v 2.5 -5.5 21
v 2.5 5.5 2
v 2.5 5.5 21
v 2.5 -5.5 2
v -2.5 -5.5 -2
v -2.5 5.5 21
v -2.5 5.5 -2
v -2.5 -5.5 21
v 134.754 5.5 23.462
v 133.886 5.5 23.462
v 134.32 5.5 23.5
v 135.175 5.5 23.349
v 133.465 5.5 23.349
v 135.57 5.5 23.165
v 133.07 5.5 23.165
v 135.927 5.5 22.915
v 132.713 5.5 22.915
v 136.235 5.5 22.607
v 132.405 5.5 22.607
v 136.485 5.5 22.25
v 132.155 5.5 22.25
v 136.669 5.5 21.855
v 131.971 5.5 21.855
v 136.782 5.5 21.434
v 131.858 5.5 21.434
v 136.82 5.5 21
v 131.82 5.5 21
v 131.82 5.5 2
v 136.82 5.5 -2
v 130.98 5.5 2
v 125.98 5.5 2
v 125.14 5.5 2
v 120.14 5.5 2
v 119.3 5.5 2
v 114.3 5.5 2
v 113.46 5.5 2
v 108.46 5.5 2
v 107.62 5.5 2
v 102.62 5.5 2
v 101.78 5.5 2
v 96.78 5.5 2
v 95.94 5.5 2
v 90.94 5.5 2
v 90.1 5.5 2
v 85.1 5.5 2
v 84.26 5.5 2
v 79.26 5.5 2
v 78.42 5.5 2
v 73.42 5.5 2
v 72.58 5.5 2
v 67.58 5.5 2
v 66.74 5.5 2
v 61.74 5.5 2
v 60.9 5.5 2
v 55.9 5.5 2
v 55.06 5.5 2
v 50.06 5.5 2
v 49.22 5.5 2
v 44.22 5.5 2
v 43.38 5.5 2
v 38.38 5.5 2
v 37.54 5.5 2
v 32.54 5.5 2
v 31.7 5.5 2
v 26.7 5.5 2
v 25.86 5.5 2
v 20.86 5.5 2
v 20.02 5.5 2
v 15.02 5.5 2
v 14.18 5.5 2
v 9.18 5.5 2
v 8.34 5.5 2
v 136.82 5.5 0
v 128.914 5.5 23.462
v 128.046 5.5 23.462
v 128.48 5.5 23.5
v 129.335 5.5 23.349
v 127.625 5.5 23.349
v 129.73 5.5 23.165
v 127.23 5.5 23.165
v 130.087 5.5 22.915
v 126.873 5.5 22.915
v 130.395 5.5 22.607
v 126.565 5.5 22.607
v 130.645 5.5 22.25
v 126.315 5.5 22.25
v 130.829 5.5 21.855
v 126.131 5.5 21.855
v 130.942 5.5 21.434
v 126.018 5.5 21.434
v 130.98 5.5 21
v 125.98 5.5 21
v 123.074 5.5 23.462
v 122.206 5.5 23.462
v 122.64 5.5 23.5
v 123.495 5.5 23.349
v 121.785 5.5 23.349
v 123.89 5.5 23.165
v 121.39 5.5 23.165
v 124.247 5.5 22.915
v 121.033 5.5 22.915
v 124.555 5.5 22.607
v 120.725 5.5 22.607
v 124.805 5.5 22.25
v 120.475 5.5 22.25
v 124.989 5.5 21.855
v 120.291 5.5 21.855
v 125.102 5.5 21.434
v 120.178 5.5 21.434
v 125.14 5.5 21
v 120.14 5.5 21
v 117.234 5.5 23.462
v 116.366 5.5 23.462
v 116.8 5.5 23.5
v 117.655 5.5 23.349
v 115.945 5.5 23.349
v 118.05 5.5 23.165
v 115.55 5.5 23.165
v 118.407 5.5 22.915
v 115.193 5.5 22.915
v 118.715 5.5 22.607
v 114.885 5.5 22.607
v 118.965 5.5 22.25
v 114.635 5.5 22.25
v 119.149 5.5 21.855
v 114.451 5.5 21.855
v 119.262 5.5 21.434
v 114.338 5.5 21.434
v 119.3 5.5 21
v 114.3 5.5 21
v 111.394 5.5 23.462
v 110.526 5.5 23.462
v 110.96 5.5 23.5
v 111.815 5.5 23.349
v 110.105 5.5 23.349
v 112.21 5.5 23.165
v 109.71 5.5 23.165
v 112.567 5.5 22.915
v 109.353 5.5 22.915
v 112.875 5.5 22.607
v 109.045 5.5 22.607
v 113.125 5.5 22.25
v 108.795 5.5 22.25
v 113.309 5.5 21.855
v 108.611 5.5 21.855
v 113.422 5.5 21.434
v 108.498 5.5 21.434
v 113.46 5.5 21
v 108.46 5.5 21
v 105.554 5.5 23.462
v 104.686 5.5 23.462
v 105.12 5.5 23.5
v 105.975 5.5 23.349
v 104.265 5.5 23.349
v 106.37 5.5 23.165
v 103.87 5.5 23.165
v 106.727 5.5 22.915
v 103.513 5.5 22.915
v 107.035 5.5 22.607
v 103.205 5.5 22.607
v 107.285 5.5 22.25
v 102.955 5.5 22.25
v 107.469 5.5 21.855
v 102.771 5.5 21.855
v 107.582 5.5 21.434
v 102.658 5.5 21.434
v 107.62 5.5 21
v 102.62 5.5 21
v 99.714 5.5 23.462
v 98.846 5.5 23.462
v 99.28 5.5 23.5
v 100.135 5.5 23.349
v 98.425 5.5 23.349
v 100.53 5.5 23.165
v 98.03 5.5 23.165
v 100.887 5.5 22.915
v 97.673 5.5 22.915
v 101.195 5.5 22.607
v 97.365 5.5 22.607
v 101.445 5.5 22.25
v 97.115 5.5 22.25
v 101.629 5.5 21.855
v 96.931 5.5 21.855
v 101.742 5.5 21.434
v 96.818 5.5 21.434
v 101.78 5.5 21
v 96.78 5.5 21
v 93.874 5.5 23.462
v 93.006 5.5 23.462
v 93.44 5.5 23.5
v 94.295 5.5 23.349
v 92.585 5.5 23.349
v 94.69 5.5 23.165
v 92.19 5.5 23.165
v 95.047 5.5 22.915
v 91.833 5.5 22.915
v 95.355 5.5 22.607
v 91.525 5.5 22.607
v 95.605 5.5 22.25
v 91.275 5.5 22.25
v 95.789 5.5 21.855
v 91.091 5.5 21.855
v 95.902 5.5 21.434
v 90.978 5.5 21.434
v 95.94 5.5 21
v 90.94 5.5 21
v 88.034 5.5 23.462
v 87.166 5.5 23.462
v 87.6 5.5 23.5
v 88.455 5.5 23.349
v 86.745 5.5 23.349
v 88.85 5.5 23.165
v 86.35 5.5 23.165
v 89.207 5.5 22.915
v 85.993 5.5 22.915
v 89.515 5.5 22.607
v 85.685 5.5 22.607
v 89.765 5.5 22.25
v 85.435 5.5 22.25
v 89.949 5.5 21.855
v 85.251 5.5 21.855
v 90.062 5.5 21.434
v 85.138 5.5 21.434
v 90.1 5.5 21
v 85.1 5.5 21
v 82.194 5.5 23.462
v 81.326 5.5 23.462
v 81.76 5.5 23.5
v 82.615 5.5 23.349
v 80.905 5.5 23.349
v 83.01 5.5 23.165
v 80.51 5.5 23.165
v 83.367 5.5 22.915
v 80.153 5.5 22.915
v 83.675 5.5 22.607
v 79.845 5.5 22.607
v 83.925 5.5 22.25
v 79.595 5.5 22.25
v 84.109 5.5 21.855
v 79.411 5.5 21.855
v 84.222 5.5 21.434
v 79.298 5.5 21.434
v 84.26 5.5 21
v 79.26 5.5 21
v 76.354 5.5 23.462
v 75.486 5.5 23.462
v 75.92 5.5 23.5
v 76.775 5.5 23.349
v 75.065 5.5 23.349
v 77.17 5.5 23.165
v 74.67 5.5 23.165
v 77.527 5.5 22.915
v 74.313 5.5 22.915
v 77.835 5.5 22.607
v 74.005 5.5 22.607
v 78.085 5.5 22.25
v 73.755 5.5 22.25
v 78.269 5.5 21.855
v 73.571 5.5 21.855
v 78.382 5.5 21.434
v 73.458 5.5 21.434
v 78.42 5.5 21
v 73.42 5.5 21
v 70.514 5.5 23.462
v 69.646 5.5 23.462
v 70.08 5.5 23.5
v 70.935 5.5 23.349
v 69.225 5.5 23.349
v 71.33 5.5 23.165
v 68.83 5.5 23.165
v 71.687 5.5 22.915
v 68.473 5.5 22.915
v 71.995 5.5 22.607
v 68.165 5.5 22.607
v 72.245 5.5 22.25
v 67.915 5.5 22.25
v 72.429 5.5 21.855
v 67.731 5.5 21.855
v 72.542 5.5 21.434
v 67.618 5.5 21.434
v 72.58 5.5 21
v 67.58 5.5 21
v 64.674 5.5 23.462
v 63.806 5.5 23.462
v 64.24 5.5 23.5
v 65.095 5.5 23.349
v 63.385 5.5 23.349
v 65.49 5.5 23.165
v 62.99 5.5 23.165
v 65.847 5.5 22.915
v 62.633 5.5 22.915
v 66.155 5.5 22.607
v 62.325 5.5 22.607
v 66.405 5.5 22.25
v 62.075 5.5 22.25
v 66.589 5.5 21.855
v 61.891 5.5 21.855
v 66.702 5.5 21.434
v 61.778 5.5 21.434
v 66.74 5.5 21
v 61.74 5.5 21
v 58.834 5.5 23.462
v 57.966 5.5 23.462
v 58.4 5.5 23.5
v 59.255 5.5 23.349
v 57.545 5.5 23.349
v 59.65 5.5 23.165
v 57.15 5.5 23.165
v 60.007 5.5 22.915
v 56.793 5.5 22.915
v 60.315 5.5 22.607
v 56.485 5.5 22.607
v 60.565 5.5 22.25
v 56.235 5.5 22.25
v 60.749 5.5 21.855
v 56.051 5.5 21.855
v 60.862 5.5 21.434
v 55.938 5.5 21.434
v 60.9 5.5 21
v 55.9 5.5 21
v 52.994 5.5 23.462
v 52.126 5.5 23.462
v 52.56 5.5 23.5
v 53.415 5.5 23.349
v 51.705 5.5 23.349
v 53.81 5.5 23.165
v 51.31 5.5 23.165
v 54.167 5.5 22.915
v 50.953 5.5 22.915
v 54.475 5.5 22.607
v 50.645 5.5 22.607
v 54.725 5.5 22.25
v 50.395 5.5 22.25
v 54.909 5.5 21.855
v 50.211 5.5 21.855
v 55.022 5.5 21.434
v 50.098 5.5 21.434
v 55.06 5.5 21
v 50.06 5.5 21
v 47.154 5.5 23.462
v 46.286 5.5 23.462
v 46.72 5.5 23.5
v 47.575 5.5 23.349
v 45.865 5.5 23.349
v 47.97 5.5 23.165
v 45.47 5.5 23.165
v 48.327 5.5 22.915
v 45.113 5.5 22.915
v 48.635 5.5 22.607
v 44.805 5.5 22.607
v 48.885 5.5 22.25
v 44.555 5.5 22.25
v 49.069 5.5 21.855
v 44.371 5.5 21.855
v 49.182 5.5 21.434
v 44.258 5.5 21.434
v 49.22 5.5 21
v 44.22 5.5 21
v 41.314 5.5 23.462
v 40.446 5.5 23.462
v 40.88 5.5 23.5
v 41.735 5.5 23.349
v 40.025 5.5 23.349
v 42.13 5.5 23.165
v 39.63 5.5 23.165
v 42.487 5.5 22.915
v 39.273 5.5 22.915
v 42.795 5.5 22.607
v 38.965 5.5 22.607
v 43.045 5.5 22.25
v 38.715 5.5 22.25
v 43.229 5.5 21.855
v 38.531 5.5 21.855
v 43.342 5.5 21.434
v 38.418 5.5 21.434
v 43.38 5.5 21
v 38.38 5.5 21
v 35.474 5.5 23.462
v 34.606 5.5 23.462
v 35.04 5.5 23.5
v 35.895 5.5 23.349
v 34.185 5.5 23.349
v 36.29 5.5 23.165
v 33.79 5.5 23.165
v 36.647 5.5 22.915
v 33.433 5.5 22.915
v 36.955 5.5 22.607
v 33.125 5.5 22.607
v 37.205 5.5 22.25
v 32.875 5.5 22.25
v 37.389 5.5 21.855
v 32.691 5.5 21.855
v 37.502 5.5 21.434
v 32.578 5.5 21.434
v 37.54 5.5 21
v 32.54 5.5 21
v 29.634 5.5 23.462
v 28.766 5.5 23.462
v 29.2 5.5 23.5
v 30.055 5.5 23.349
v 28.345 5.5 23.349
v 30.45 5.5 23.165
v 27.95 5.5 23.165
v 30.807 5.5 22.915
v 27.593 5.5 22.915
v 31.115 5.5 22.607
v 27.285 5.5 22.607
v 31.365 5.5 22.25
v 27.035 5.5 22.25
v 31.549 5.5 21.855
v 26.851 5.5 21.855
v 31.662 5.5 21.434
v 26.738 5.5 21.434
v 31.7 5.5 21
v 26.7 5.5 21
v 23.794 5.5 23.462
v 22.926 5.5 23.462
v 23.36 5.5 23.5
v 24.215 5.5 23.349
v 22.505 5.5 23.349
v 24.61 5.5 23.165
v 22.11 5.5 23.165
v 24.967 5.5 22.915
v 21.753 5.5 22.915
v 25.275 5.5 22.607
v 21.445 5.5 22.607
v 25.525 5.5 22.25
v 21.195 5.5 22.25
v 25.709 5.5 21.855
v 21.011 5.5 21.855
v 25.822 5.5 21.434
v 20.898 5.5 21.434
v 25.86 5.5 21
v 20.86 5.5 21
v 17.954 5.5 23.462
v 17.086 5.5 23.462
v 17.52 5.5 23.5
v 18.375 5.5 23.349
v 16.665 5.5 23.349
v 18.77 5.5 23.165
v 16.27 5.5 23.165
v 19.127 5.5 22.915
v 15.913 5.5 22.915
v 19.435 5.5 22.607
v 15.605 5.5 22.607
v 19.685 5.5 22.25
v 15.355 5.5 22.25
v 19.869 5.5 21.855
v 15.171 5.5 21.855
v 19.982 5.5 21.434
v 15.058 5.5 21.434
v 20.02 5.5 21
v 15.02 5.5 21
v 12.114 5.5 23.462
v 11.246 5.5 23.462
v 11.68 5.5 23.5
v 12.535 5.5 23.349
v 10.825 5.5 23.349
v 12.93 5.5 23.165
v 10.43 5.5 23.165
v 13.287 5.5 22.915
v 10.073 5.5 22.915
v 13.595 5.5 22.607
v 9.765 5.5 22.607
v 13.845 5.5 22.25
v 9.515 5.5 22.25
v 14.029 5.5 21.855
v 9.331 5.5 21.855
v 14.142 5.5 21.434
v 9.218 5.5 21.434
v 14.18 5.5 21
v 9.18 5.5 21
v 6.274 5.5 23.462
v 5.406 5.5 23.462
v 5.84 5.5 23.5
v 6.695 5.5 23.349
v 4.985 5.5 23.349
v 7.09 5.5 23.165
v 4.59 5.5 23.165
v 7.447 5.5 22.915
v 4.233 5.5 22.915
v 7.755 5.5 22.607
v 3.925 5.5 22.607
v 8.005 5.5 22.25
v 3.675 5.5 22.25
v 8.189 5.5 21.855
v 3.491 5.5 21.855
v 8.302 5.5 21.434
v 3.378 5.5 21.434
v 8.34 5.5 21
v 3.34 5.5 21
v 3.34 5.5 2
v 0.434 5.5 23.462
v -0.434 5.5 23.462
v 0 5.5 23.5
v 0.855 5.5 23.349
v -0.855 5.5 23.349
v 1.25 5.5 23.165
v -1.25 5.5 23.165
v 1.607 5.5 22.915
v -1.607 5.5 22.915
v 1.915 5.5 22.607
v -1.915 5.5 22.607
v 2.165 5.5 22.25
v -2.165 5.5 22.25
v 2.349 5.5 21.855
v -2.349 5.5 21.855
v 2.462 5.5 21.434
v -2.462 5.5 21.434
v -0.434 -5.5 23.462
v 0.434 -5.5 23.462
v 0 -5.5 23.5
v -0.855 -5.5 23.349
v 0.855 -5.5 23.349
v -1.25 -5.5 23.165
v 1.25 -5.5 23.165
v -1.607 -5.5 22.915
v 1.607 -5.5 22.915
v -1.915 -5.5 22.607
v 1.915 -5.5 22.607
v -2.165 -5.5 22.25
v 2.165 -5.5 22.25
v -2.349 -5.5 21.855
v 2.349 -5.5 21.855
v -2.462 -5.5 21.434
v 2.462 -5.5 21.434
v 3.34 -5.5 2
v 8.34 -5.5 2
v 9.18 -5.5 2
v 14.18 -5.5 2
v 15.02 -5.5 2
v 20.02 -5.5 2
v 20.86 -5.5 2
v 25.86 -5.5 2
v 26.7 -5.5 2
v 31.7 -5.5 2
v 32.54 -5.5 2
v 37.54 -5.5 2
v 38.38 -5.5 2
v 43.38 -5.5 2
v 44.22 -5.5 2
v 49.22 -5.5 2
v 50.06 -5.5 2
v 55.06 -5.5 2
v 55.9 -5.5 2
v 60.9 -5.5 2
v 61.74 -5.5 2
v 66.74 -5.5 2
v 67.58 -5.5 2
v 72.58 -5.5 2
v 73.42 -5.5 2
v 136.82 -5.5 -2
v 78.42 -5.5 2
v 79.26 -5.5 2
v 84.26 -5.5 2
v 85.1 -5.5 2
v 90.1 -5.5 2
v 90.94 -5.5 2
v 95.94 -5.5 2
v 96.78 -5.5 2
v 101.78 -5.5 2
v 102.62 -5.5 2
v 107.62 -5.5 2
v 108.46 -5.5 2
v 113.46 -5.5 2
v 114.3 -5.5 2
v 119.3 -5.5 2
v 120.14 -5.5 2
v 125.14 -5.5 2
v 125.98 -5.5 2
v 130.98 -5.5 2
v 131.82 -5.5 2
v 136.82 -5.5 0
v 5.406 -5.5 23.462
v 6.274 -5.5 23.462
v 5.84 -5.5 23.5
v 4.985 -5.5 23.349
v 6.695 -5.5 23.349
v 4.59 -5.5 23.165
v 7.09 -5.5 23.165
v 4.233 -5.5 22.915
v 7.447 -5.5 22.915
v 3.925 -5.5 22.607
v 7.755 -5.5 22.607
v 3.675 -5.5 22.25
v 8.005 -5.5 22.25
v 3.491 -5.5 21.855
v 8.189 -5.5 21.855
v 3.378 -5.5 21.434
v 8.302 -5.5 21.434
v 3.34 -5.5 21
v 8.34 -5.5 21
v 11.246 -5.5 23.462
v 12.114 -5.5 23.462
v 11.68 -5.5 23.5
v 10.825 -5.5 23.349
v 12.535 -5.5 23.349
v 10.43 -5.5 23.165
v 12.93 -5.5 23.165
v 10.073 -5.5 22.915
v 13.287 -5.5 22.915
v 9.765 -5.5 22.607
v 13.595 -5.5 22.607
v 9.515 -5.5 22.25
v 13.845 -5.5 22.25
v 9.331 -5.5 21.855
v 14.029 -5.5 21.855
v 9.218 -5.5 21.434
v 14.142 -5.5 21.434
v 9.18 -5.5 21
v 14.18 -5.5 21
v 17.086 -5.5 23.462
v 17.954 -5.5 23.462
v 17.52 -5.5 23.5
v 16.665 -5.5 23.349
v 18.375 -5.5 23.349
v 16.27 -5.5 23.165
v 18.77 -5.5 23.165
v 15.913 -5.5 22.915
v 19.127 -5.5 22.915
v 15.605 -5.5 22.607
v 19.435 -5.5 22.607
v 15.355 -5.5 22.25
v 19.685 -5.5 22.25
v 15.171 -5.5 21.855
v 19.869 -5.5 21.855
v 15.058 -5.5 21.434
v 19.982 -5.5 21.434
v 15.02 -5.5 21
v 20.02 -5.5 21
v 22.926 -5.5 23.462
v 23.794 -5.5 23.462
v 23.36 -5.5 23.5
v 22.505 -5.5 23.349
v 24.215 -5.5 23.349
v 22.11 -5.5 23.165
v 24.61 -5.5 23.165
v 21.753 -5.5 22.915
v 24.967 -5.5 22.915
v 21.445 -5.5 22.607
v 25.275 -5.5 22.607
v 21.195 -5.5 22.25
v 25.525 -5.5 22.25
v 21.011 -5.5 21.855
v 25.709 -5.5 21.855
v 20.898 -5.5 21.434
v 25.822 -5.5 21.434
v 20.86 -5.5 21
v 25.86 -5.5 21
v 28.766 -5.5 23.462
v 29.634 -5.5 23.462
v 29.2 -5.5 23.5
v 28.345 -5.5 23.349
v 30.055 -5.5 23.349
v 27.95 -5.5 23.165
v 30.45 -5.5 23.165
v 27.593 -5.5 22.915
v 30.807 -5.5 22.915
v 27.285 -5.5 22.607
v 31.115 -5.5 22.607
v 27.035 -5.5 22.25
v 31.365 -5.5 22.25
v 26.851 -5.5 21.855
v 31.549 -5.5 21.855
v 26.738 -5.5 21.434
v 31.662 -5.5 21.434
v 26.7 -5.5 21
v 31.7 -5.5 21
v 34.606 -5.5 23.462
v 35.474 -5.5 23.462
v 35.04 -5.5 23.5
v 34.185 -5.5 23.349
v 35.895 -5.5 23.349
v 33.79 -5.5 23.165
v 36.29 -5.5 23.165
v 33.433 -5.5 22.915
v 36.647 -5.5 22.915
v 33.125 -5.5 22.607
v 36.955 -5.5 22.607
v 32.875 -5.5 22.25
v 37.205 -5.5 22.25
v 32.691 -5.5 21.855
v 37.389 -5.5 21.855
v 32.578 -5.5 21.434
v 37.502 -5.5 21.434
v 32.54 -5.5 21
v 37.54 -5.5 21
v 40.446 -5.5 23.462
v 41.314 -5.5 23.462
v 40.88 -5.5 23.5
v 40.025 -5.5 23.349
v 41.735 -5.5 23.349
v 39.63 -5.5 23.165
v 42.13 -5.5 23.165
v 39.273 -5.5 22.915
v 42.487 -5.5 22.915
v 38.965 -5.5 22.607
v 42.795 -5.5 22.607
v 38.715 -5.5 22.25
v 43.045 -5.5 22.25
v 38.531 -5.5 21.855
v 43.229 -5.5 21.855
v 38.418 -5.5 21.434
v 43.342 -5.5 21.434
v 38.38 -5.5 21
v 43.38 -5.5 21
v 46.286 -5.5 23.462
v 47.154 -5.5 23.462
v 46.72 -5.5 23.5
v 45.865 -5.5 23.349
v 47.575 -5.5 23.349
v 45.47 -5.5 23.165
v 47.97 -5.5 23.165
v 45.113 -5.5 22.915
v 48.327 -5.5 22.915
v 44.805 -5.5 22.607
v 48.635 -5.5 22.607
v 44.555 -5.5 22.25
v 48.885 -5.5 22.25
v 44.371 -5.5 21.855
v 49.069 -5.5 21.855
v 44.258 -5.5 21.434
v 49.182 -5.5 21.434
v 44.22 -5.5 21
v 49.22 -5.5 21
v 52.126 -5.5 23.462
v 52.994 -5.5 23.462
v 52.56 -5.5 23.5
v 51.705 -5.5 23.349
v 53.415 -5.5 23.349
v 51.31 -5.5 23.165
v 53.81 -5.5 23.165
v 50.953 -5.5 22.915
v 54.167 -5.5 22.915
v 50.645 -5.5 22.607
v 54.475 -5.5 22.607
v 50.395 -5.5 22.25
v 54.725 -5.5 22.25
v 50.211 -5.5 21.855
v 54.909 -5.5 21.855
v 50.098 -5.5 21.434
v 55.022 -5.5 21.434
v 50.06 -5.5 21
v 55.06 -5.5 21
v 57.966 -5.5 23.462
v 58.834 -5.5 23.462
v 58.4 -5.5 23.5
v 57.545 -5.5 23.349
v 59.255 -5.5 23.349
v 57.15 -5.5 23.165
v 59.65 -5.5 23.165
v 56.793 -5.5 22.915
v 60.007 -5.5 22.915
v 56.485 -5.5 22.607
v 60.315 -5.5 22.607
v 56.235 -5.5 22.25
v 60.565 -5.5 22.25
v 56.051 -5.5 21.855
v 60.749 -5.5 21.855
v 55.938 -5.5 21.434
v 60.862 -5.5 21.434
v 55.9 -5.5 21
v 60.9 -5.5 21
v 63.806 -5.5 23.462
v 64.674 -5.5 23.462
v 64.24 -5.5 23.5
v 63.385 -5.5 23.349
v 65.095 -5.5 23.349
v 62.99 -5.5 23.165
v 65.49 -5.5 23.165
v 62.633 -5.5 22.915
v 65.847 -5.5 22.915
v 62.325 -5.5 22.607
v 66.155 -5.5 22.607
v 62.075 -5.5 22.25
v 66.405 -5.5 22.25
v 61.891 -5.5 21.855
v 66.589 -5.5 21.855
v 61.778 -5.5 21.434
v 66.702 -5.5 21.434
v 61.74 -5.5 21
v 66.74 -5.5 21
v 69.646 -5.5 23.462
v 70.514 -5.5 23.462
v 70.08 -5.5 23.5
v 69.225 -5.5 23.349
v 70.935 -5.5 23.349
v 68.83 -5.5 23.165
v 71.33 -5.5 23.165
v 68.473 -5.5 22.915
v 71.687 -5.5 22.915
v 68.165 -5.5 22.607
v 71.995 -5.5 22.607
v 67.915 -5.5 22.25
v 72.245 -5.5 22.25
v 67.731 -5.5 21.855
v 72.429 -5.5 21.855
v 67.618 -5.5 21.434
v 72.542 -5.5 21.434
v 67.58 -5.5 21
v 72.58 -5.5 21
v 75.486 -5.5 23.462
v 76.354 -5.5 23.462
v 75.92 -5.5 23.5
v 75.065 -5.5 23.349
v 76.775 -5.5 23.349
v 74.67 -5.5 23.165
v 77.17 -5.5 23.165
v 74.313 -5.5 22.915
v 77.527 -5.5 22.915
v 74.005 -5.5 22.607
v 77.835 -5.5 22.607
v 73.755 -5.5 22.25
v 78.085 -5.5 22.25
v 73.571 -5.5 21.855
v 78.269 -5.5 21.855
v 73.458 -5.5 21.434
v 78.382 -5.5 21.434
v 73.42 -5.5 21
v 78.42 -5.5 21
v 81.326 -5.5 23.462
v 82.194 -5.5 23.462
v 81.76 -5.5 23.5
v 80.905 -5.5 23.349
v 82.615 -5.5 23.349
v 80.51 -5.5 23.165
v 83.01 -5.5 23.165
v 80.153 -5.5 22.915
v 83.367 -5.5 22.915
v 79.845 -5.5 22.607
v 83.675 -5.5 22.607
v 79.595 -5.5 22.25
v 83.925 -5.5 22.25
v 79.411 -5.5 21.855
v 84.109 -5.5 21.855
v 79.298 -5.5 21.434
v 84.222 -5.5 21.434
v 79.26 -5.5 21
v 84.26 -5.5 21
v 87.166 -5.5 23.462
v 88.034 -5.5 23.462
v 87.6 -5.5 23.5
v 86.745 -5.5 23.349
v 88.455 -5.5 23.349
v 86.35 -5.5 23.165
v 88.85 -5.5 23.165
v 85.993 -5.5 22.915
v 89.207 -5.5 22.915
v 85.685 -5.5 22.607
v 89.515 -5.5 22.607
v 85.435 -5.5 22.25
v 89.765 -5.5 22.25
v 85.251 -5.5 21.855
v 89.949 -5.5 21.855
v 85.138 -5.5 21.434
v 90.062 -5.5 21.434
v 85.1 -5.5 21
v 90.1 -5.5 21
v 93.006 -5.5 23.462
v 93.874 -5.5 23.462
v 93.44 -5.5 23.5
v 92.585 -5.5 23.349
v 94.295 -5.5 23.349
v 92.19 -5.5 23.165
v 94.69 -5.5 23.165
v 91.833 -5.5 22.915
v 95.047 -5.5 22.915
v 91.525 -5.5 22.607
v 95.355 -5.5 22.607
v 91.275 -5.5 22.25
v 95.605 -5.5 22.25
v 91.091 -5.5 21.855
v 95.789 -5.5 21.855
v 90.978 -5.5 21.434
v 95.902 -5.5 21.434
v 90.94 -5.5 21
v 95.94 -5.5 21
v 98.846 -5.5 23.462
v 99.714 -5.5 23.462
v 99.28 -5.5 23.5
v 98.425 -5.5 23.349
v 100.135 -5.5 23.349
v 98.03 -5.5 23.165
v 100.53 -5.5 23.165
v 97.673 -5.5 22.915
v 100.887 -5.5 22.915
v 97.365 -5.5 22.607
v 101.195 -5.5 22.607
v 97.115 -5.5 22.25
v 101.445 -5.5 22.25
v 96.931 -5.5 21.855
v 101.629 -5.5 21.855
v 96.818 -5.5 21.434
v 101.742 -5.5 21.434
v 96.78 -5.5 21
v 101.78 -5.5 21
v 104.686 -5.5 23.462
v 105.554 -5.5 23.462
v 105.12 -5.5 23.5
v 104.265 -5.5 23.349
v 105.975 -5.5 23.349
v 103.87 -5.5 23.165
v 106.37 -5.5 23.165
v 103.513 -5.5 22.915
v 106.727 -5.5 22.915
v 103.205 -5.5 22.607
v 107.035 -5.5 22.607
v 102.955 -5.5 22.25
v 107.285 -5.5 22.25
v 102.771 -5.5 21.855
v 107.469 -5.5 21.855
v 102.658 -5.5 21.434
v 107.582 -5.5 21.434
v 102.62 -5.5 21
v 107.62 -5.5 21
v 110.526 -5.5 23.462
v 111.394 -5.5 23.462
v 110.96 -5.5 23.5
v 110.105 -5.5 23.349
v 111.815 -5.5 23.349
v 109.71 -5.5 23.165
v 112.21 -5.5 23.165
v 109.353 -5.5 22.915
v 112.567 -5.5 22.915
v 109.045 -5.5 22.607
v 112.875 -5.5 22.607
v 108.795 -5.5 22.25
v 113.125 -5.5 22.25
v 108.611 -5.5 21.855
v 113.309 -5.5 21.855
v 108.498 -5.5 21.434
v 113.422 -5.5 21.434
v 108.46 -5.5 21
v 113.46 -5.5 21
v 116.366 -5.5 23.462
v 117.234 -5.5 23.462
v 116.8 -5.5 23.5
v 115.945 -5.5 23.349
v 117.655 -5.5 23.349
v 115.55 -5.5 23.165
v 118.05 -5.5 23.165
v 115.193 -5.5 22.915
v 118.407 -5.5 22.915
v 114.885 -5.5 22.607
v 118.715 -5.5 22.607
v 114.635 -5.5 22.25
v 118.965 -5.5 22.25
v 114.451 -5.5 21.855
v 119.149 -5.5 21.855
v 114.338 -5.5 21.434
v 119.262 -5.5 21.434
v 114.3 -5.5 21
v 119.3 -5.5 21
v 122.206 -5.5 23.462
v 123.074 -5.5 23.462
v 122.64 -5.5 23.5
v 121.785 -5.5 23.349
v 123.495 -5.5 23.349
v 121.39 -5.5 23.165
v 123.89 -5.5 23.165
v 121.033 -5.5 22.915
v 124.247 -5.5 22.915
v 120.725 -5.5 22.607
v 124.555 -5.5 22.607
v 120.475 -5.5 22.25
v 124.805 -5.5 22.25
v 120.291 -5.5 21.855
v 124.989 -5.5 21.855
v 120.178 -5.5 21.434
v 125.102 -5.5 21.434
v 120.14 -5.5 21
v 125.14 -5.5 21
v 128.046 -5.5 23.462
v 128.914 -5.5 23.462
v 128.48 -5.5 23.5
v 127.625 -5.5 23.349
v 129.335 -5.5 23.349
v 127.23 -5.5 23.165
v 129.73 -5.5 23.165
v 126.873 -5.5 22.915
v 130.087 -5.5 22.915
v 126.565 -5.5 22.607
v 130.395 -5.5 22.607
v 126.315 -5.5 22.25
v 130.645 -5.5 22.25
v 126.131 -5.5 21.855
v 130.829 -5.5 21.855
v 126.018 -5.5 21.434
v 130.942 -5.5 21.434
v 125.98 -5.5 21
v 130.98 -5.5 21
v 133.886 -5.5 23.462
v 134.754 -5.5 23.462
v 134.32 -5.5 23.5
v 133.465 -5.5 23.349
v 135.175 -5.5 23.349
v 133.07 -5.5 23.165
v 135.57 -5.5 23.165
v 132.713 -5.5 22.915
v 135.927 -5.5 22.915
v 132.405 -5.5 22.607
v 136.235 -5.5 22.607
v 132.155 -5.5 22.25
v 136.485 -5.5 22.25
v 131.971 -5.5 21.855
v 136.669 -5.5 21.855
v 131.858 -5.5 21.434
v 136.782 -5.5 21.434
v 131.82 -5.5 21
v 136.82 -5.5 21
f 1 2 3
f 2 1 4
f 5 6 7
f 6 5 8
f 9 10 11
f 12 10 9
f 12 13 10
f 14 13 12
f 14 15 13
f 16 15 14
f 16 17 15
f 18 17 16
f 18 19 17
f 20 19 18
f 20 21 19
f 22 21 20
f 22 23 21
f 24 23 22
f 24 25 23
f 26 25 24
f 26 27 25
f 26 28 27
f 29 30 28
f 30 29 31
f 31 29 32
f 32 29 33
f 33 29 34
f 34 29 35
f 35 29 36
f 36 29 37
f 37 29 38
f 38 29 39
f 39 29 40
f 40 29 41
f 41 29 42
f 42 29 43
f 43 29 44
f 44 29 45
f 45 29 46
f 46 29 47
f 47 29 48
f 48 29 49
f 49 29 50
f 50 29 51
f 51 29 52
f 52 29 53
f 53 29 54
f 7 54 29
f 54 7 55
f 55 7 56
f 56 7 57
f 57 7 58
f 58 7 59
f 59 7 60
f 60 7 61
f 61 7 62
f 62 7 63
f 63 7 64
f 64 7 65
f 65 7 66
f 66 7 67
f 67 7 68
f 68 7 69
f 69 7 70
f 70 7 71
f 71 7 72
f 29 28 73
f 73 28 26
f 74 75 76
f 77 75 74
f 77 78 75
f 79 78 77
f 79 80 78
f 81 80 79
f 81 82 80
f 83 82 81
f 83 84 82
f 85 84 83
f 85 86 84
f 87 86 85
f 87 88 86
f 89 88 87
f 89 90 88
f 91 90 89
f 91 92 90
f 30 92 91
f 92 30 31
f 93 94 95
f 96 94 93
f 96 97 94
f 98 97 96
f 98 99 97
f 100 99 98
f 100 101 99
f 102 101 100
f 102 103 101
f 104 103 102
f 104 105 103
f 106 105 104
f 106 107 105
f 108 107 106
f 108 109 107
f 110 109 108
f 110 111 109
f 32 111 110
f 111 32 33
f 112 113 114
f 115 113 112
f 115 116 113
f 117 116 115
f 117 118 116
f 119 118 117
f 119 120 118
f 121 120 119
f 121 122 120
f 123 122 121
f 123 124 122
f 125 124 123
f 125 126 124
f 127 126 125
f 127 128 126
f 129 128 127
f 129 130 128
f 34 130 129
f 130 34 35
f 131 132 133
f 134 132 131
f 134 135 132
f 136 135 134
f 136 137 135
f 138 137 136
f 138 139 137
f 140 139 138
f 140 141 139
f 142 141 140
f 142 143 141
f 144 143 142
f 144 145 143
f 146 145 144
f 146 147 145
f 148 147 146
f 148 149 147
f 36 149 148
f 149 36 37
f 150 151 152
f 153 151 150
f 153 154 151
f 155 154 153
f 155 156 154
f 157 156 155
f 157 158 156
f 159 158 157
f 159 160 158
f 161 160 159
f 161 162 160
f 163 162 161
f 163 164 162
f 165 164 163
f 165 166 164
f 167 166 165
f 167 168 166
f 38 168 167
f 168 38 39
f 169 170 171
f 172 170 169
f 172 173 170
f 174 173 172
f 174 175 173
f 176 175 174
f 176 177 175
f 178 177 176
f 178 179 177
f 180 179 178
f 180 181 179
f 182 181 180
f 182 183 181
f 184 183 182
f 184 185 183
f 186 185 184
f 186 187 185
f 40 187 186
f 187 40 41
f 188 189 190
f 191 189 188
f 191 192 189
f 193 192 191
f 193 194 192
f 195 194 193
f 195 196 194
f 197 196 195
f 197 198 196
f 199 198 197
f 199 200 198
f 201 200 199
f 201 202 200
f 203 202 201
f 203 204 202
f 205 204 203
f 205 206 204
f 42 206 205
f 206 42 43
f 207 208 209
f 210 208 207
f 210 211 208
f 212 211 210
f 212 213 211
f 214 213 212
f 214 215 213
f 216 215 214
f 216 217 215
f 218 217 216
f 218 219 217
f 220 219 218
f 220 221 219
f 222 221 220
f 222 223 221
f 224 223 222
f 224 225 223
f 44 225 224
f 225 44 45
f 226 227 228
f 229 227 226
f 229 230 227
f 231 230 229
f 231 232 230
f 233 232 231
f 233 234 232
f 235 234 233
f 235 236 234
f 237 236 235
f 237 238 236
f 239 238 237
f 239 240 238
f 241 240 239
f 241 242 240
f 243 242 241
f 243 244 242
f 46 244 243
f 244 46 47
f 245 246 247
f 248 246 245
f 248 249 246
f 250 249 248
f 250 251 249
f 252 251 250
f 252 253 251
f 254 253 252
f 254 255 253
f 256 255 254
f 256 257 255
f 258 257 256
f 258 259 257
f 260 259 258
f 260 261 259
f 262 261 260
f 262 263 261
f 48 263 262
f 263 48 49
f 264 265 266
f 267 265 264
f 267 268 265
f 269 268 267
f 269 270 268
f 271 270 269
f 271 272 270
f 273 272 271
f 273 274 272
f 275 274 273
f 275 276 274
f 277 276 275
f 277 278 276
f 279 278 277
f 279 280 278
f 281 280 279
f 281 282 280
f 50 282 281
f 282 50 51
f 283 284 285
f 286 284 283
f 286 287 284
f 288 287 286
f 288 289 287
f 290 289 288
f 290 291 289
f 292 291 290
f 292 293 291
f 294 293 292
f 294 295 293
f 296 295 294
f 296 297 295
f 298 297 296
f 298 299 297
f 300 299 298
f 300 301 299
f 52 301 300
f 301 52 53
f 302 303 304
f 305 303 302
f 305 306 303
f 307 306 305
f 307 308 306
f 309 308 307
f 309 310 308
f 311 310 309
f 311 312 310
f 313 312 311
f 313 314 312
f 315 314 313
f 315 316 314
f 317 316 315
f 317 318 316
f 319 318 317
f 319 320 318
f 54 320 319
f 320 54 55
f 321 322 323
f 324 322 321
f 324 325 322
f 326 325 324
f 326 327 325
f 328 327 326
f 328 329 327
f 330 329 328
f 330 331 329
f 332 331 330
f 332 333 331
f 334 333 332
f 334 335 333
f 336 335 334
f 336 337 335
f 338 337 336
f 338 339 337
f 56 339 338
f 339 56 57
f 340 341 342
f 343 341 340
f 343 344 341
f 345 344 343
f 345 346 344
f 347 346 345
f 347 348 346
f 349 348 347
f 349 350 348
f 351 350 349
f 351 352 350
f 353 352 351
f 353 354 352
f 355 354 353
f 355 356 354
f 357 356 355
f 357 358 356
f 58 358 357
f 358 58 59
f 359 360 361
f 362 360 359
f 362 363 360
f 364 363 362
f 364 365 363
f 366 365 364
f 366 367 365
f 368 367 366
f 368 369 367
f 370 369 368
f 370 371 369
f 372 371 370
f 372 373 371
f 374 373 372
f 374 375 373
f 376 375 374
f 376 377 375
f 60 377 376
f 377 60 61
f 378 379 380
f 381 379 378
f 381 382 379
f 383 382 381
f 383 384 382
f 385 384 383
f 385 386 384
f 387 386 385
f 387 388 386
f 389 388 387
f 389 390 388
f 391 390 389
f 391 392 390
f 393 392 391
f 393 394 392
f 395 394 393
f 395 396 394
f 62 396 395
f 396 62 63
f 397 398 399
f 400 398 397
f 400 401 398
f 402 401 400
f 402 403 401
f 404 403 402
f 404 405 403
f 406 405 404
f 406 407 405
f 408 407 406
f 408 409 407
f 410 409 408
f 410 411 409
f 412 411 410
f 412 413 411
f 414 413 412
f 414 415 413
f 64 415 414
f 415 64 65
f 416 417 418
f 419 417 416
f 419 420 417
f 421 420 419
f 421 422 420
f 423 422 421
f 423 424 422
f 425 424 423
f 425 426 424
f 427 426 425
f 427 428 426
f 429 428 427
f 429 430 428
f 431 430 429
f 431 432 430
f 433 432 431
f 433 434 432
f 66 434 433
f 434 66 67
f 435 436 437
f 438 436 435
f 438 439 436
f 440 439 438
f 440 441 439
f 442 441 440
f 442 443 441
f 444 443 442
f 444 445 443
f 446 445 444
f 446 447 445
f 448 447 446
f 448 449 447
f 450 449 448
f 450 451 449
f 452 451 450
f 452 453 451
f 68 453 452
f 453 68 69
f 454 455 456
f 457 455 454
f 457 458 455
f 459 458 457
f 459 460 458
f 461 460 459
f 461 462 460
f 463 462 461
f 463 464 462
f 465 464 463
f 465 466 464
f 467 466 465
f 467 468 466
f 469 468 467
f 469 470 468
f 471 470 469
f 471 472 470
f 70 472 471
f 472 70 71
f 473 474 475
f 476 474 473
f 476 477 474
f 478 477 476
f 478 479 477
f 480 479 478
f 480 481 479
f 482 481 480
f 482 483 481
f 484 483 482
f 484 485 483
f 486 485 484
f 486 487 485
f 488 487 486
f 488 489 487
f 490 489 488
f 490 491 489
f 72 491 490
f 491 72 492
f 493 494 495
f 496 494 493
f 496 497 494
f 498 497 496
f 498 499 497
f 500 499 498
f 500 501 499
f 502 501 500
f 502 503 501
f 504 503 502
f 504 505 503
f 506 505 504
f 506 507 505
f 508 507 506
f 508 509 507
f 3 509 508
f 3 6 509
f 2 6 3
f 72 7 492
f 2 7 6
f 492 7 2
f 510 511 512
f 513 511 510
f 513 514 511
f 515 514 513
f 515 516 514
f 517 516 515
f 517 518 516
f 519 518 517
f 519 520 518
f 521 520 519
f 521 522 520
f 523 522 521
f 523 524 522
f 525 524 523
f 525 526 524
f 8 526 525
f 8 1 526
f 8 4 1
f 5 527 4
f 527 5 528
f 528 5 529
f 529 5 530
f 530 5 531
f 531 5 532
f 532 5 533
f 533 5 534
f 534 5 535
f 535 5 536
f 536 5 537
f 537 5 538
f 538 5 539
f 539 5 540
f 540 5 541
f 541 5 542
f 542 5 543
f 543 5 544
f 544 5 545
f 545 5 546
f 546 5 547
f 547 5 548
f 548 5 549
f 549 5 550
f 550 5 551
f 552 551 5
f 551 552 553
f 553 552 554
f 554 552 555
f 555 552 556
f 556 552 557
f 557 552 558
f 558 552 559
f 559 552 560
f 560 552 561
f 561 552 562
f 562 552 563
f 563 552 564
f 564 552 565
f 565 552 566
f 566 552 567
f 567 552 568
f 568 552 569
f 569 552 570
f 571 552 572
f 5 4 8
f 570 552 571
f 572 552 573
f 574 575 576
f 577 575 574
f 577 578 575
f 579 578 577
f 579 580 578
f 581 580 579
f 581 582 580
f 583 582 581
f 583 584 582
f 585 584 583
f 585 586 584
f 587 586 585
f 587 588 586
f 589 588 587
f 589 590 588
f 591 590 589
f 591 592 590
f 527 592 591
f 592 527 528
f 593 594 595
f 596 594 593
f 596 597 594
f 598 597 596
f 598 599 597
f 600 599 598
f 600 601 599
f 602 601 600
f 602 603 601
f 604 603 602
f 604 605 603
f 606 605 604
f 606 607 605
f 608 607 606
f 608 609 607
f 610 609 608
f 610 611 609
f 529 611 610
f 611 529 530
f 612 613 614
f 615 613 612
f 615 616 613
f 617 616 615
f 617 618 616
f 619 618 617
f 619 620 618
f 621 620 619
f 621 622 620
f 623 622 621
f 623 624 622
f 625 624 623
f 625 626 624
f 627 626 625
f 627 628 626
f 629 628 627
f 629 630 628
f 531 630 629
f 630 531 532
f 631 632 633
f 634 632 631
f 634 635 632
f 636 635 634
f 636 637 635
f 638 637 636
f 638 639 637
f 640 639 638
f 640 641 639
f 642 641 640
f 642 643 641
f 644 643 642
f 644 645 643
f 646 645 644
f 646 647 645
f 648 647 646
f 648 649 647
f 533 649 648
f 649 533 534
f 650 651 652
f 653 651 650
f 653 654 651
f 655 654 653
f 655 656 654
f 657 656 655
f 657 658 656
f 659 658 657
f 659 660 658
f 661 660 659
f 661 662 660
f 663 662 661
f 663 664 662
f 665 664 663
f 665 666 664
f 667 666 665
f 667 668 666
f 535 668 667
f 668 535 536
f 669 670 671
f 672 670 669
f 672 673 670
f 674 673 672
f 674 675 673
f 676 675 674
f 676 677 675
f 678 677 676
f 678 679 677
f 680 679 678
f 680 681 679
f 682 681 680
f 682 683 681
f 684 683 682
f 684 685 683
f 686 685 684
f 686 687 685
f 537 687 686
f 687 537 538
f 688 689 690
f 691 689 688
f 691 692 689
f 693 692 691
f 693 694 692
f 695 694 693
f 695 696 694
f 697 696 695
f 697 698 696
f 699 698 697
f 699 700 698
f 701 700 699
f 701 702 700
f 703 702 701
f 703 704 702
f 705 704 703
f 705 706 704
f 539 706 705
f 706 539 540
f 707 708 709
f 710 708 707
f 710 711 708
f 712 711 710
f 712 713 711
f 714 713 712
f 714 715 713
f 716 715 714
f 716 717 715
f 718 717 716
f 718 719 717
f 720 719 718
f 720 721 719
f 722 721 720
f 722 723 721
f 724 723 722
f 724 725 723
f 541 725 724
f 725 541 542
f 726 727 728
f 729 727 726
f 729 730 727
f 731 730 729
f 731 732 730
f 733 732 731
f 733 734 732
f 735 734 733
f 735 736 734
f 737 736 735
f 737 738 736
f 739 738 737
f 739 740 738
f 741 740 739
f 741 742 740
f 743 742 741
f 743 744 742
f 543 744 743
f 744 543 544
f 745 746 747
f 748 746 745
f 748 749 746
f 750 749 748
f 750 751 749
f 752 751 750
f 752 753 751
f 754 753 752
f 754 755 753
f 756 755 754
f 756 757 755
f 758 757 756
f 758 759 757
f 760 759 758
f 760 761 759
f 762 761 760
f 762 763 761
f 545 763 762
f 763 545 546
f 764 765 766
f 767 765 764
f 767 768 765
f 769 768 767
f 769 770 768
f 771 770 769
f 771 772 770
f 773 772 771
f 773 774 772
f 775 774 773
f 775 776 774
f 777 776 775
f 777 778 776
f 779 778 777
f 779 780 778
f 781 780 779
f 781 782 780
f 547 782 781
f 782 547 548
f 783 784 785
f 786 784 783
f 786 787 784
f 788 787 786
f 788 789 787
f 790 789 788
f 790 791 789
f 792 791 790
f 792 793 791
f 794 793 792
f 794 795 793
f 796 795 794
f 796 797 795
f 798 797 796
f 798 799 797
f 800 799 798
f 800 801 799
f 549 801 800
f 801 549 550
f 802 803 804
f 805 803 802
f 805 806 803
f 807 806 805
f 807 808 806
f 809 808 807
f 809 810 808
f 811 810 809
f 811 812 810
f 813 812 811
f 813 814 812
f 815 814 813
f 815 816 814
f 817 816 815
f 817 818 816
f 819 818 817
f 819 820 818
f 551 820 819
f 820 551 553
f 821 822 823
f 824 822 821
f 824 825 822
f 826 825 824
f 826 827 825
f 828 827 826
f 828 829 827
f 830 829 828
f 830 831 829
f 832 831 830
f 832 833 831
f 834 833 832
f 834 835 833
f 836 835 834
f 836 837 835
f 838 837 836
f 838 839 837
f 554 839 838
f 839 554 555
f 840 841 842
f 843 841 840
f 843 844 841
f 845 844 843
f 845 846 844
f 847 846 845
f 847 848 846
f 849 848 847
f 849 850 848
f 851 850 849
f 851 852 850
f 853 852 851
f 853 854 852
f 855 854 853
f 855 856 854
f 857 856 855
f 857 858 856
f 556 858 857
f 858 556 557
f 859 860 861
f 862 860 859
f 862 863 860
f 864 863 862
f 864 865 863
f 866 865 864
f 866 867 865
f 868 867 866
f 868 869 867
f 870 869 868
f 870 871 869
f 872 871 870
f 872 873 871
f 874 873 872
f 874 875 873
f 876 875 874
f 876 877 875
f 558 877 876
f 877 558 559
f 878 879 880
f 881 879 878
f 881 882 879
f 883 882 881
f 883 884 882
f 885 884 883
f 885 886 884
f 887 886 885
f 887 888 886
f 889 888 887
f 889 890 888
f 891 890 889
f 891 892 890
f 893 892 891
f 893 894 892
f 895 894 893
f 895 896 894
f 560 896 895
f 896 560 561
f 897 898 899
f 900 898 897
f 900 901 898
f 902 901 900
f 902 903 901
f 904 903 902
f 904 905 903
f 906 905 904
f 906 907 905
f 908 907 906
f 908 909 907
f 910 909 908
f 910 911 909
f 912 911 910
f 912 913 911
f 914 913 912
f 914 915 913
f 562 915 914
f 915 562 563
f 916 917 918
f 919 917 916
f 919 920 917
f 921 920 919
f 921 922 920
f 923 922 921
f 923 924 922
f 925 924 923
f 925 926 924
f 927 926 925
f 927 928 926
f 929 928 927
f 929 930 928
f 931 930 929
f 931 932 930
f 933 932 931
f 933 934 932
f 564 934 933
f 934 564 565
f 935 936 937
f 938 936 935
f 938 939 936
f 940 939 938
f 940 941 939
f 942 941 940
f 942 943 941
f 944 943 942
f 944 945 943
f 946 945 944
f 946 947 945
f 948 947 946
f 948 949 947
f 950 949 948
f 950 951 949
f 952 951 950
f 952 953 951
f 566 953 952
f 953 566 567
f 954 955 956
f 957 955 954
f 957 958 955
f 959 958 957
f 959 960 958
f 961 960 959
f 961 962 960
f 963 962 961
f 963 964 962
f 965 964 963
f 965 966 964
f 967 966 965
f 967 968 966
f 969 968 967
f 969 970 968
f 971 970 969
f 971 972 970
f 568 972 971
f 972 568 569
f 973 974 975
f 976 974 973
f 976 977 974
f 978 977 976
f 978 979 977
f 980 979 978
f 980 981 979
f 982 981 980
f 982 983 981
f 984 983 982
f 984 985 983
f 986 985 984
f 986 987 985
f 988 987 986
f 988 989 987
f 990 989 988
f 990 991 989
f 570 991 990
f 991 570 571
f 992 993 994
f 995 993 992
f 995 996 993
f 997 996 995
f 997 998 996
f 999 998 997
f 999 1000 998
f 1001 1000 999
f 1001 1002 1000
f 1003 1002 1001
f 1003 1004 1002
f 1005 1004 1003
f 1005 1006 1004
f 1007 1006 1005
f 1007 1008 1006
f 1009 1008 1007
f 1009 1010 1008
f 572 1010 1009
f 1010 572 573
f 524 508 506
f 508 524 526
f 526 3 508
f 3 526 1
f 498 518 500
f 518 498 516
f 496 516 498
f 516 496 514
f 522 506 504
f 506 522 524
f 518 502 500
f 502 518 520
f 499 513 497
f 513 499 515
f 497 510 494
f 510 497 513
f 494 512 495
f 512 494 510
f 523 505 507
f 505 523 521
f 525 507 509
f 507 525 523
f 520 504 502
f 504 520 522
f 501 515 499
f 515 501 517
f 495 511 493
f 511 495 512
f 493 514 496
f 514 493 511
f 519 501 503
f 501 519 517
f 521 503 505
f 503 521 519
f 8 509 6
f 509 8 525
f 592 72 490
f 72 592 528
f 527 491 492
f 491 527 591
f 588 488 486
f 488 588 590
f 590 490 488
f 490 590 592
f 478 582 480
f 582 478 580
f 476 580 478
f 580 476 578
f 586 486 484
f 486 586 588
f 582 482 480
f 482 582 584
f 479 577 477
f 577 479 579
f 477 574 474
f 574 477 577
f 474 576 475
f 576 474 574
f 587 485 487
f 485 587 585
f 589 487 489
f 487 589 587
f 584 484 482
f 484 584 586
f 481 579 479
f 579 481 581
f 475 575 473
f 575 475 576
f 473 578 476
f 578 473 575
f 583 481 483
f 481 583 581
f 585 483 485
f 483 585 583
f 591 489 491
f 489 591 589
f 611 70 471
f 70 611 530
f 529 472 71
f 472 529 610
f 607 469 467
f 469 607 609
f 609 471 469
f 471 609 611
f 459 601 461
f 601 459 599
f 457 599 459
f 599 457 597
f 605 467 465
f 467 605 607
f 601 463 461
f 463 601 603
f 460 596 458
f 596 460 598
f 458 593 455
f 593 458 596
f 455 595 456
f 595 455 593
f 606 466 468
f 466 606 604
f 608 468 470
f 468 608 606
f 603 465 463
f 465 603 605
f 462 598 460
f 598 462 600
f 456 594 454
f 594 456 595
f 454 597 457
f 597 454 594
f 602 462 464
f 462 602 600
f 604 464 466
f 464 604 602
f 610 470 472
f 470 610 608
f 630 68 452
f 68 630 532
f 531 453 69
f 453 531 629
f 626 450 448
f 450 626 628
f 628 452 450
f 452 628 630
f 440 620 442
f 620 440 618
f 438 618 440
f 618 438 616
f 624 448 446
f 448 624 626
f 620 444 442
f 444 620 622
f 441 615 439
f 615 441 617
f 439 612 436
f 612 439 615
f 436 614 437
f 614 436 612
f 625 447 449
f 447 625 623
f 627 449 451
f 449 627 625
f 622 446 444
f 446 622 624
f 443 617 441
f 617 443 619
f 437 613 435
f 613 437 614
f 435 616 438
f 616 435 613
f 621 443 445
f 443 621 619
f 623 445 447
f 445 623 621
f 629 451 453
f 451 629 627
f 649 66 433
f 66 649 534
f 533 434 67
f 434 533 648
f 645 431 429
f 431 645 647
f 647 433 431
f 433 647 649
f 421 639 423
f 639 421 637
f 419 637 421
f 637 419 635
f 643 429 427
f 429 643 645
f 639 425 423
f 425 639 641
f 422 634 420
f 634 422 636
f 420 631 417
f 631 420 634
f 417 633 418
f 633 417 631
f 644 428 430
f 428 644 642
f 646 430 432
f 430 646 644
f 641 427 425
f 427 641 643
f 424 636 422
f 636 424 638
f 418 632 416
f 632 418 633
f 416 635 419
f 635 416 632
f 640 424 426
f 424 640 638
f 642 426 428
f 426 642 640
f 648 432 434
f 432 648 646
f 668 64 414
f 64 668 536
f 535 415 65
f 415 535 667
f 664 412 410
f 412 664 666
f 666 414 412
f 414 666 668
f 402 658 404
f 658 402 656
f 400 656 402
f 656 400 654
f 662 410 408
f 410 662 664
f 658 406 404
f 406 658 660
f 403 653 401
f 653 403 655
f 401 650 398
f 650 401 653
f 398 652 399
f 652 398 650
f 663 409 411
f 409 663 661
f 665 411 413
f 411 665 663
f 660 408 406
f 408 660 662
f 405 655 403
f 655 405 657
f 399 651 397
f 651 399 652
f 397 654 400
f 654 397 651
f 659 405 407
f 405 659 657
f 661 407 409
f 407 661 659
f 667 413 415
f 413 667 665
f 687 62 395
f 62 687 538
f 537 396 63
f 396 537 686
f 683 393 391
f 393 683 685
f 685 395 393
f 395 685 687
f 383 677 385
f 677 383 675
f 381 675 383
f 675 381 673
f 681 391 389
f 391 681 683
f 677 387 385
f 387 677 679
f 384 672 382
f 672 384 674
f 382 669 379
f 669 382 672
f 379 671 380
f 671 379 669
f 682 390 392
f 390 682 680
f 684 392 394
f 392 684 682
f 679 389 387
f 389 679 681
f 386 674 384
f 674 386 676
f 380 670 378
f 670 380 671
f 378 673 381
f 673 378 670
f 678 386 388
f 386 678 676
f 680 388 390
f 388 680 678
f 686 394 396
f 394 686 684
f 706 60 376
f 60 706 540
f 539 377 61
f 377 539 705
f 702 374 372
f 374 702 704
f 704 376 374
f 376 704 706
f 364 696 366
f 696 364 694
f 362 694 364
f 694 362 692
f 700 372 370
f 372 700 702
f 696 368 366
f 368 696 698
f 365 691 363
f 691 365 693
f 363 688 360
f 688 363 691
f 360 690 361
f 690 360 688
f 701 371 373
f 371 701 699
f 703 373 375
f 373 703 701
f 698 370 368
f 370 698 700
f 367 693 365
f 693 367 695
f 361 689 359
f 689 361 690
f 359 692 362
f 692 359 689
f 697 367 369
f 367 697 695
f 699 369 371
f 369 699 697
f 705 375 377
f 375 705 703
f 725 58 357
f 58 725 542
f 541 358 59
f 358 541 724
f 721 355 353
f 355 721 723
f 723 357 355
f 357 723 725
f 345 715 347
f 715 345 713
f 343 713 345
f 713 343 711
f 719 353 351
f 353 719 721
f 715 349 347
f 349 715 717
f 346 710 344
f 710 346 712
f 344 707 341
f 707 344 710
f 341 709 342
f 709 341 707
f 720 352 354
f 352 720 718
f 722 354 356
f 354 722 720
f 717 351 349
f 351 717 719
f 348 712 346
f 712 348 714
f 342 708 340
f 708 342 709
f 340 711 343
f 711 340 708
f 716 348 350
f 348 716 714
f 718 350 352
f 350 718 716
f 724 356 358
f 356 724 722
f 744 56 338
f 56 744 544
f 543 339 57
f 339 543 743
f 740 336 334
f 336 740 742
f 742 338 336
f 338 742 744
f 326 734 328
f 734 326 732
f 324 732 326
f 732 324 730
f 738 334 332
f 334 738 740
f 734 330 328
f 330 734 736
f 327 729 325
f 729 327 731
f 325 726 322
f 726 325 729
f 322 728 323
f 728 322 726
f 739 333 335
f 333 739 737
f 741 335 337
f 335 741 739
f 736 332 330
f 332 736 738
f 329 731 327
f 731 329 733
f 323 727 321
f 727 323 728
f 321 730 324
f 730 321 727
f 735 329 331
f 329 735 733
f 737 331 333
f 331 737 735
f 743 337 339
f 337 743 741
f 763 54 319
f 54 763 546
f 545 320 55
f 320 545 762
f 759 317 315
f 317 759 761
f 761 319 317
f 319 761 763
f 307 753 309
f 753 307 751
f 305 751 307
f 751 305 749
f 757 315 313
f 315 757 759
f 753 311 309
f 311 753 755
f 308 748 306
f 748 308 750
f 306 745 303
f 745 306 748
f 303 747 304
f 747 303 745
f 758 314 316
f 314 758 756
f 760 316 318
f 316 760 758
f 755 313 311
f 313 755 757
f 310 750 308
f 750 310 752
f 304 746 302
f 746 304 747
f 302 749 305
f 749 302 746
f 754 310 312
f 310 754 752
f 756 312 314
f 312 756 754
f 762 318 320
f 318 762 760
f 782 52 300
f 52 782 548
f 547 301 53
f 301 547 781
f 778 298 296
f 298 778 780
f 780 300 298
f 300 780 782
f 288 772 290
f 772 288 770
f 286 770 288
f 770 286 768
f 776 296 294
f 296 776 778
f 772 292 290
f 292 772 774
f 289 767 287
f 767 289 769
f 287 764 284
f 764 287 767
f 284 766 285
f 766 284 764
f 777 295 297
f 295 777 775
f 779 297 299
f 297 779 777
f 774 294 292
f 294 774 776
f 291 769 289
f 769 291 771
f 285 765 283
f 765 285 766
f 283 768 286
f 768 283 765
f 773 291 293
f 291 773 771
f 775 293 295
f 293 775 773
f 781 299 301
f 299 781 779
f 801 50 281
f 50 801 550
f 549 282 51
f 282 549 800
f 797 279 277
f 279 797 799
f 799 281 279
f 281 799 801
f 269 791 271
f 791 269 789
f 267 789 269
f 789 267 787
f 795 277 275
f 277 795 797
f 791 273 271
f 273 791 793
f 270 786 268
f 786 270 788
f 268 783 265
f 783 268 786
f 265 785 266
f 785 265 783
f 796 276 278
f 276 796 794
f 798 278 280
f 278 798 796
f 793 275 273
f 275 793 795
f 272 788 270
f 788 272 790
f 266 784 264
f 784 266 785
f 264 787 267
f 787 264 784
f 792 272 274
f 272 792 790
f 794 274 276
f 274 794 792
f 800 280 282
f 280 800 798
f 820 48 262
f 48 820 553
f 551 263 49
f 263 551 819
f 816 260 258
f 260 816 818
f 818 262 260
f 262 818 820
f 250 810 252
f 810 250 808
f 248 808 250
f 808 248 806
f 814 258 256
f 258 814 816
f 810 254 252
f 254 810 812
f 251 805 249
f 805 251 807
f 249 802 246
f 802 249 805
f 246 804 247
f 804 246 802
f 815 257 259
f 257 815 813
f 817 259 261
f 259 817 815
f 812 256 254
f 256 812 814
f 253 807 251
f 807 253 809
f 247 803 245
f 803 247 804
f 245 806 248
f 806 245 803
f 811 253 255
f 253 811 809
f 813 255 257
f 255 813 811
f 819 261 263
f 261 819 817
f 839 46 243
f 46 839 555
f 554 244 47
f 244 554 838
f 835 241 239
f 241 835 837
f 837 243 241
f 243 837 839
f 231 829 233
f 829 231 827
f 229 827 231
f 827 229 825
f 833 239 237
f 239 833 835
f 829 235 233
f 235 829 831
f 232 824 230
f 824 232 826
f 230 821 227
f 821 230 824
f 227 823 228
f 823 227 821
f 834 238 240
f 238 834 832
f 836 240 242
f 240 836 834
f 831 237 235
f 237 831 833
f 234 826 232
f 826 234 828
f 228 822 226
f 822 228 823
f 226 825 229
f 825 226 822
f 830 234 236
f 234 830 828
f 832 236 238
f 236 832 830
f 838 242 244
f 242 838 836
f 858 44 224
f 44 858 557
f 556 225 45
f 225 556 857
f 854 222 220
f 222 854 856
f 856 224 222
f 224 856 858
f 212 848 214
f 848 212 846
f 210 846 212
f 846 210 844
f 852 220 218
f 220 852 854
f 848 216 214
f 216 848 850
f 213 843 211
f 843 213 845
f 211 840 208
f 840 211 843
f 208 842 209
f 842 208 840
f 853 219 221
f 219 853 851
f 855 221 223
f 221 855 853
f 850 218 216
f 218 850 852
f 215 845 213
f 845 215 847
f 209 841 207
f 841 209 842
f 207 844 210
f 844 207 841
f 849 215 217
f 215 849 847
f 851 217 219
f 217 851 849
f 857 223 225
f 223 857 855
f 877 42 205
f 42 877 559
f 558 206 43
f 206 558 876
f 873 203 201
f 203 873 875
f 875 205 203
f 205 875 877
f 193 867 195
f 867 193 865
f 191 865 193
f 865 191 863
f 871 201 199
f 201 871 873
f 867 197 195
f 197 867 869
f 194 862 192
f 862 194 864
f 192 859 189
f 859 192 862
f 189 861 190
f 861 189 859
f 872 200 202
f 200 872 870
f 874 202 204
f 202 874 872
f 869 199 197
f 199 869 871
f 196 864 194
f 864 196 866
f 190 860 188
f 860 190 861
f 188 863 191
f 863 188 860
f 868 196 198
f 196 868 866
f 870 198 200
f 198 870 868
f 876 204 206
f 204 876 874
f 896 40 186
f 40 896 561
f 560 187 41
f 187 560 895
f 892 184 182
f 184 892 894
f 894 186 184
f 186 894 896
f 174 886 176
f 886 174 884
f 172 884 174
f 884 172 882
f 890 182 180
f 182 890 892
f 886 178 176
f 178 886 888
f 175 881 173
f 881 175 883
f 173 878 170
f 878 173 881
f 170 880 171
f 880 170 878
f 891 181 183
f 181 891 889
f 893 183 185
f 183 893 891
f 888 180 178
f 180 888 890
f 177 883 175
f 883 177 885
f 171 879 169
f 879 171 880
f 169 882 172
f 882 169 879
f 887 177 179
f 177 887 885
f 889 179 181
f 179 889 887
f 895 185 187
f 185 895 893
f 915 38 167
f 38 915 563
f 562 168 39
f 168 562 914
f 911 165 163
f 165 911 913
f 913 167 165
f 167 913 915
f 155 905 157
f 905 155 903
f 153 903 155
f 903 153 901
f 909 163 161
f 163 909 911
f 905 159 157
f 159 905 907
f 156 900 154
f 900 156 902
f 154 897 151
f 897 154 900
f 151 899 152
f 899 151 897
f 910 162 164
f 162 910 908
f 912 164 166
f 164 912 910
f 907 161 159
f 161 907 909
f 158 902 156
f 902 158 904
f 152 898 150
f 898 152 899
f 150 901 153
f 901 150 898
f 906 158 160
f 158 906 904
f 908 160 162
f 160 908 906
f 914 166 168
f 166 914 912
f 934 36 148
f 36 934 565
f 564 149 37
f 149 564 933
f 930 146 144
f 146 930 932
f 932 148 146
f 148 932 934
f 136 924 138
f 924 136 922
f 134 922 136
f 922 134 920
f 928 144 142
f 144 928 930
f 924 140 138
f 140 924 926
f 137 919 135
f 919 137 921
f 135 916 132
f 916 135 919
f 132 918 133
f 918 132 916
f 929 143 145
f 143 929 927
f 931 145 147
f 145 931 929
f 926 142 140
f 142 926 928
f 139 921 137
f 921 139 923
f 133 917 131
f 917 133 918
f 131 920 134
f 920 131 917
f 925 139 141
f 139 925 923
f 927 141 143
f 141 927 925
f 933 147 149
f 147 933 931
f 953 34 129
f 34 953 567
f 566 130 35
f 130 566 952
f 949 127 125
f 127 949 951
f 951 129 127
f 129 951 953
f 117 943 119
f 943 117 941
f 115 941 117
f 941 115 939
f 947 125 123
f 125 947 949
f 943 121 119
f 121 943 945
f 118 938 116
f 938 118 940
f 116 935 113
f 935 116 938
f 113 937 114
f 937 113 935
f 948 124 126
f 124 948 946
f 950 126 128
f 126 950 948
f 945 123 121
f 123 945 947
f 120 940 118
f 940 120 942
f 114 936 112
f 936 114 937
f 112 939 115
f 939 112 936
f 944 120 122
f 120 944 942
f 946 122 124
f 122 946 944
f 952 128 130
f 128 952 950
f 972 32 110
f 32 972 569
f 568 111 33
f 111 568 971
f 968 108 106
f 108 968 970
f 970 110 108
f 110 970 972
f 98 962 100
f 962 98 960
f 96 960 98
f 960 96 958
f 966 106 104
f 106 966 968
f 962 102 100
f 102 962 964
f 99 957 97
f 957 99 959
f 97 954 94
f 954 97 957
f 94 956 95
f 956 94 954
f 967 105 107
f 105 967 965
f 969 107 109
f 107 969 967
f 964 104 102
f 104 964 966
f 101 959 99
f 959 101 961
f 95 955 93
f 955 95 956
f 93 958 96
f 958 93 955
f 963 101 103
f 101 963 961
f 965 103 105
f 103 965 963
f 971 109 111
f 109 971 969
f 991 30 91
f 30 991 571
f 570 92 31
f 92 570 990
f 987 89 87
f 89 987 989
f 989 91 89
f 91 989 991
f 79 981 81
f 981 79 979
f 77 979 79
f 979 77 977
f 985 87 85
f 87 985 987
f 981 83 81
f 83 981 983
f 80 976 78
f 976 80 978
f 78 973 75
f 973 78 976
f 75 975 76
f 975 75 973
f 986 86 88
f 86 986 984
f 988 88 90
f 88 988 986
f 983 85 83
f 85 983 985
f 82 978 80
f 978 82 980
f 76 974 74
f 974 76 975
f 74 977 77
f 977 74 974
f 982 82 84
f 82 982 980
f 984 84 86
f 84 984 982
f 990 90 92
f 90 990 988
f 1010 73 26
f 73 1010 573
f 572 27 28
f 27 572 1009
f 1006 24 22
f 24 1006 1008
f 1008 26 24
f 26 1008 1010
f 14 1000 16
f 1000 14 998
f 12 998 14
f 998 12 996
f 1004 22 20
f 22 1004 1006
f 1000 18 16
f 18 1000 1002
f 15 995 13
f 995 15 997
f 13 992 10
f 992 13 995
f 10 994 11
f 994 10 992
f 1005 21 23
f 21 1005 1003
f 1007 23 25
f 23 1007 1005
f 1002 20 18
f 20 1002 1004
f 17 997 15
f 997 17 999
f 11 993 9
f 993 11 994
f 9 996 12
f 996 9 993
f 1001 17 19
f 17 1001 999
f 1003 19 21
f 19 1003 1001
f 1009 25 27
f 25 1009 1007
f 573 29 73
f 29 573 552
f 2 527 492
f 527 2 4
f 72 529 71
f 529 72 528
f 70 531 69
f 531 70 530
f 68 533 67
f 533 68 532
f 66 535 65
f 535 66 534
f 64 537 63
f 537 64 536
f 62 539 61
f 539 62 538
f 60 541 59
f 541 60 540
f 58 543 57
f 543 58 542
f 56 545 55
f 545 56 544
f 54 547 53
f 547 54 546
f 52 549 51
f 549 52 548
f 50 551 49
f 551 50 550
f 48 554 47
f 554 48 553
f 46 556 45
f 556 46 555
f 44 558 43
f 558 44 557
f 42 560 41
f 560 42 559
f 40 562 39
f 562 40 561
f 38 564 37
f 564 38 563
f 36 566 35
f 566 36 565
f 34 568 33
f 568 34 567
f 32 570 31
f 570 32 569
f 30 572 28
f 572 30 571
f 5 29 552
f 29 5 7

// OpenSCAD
$fn=36;

// unit is mm

swi = 0.84; // slit width
swi2 = swi / 2;

tow = 5; // tooth width
tot = 11; // tooth thickness
toh = 21; // tooth height

tec = 23; // teeth count

bah = 4; // base height


module tooth() {
  translate([ 0, 0, toh / 2 ])
    cube(size=[ tow, tot, toh ], center=true);
  translate([ 0, 0, toh ])
    rotate([ 90, 0, 0 ]) cylinder(d=tow, h=tot, center=true);
}

for (i = [0:tec]) {
  translate([ i * (tow + swi), 0, 0 ]) tooth();
}

l = tow + tec * (tow + swi);
echo(l);

translate([ l / 2 - tow / 2, 0, 0 ])
  cube(size=[ l, tot, bah ], center=true);
